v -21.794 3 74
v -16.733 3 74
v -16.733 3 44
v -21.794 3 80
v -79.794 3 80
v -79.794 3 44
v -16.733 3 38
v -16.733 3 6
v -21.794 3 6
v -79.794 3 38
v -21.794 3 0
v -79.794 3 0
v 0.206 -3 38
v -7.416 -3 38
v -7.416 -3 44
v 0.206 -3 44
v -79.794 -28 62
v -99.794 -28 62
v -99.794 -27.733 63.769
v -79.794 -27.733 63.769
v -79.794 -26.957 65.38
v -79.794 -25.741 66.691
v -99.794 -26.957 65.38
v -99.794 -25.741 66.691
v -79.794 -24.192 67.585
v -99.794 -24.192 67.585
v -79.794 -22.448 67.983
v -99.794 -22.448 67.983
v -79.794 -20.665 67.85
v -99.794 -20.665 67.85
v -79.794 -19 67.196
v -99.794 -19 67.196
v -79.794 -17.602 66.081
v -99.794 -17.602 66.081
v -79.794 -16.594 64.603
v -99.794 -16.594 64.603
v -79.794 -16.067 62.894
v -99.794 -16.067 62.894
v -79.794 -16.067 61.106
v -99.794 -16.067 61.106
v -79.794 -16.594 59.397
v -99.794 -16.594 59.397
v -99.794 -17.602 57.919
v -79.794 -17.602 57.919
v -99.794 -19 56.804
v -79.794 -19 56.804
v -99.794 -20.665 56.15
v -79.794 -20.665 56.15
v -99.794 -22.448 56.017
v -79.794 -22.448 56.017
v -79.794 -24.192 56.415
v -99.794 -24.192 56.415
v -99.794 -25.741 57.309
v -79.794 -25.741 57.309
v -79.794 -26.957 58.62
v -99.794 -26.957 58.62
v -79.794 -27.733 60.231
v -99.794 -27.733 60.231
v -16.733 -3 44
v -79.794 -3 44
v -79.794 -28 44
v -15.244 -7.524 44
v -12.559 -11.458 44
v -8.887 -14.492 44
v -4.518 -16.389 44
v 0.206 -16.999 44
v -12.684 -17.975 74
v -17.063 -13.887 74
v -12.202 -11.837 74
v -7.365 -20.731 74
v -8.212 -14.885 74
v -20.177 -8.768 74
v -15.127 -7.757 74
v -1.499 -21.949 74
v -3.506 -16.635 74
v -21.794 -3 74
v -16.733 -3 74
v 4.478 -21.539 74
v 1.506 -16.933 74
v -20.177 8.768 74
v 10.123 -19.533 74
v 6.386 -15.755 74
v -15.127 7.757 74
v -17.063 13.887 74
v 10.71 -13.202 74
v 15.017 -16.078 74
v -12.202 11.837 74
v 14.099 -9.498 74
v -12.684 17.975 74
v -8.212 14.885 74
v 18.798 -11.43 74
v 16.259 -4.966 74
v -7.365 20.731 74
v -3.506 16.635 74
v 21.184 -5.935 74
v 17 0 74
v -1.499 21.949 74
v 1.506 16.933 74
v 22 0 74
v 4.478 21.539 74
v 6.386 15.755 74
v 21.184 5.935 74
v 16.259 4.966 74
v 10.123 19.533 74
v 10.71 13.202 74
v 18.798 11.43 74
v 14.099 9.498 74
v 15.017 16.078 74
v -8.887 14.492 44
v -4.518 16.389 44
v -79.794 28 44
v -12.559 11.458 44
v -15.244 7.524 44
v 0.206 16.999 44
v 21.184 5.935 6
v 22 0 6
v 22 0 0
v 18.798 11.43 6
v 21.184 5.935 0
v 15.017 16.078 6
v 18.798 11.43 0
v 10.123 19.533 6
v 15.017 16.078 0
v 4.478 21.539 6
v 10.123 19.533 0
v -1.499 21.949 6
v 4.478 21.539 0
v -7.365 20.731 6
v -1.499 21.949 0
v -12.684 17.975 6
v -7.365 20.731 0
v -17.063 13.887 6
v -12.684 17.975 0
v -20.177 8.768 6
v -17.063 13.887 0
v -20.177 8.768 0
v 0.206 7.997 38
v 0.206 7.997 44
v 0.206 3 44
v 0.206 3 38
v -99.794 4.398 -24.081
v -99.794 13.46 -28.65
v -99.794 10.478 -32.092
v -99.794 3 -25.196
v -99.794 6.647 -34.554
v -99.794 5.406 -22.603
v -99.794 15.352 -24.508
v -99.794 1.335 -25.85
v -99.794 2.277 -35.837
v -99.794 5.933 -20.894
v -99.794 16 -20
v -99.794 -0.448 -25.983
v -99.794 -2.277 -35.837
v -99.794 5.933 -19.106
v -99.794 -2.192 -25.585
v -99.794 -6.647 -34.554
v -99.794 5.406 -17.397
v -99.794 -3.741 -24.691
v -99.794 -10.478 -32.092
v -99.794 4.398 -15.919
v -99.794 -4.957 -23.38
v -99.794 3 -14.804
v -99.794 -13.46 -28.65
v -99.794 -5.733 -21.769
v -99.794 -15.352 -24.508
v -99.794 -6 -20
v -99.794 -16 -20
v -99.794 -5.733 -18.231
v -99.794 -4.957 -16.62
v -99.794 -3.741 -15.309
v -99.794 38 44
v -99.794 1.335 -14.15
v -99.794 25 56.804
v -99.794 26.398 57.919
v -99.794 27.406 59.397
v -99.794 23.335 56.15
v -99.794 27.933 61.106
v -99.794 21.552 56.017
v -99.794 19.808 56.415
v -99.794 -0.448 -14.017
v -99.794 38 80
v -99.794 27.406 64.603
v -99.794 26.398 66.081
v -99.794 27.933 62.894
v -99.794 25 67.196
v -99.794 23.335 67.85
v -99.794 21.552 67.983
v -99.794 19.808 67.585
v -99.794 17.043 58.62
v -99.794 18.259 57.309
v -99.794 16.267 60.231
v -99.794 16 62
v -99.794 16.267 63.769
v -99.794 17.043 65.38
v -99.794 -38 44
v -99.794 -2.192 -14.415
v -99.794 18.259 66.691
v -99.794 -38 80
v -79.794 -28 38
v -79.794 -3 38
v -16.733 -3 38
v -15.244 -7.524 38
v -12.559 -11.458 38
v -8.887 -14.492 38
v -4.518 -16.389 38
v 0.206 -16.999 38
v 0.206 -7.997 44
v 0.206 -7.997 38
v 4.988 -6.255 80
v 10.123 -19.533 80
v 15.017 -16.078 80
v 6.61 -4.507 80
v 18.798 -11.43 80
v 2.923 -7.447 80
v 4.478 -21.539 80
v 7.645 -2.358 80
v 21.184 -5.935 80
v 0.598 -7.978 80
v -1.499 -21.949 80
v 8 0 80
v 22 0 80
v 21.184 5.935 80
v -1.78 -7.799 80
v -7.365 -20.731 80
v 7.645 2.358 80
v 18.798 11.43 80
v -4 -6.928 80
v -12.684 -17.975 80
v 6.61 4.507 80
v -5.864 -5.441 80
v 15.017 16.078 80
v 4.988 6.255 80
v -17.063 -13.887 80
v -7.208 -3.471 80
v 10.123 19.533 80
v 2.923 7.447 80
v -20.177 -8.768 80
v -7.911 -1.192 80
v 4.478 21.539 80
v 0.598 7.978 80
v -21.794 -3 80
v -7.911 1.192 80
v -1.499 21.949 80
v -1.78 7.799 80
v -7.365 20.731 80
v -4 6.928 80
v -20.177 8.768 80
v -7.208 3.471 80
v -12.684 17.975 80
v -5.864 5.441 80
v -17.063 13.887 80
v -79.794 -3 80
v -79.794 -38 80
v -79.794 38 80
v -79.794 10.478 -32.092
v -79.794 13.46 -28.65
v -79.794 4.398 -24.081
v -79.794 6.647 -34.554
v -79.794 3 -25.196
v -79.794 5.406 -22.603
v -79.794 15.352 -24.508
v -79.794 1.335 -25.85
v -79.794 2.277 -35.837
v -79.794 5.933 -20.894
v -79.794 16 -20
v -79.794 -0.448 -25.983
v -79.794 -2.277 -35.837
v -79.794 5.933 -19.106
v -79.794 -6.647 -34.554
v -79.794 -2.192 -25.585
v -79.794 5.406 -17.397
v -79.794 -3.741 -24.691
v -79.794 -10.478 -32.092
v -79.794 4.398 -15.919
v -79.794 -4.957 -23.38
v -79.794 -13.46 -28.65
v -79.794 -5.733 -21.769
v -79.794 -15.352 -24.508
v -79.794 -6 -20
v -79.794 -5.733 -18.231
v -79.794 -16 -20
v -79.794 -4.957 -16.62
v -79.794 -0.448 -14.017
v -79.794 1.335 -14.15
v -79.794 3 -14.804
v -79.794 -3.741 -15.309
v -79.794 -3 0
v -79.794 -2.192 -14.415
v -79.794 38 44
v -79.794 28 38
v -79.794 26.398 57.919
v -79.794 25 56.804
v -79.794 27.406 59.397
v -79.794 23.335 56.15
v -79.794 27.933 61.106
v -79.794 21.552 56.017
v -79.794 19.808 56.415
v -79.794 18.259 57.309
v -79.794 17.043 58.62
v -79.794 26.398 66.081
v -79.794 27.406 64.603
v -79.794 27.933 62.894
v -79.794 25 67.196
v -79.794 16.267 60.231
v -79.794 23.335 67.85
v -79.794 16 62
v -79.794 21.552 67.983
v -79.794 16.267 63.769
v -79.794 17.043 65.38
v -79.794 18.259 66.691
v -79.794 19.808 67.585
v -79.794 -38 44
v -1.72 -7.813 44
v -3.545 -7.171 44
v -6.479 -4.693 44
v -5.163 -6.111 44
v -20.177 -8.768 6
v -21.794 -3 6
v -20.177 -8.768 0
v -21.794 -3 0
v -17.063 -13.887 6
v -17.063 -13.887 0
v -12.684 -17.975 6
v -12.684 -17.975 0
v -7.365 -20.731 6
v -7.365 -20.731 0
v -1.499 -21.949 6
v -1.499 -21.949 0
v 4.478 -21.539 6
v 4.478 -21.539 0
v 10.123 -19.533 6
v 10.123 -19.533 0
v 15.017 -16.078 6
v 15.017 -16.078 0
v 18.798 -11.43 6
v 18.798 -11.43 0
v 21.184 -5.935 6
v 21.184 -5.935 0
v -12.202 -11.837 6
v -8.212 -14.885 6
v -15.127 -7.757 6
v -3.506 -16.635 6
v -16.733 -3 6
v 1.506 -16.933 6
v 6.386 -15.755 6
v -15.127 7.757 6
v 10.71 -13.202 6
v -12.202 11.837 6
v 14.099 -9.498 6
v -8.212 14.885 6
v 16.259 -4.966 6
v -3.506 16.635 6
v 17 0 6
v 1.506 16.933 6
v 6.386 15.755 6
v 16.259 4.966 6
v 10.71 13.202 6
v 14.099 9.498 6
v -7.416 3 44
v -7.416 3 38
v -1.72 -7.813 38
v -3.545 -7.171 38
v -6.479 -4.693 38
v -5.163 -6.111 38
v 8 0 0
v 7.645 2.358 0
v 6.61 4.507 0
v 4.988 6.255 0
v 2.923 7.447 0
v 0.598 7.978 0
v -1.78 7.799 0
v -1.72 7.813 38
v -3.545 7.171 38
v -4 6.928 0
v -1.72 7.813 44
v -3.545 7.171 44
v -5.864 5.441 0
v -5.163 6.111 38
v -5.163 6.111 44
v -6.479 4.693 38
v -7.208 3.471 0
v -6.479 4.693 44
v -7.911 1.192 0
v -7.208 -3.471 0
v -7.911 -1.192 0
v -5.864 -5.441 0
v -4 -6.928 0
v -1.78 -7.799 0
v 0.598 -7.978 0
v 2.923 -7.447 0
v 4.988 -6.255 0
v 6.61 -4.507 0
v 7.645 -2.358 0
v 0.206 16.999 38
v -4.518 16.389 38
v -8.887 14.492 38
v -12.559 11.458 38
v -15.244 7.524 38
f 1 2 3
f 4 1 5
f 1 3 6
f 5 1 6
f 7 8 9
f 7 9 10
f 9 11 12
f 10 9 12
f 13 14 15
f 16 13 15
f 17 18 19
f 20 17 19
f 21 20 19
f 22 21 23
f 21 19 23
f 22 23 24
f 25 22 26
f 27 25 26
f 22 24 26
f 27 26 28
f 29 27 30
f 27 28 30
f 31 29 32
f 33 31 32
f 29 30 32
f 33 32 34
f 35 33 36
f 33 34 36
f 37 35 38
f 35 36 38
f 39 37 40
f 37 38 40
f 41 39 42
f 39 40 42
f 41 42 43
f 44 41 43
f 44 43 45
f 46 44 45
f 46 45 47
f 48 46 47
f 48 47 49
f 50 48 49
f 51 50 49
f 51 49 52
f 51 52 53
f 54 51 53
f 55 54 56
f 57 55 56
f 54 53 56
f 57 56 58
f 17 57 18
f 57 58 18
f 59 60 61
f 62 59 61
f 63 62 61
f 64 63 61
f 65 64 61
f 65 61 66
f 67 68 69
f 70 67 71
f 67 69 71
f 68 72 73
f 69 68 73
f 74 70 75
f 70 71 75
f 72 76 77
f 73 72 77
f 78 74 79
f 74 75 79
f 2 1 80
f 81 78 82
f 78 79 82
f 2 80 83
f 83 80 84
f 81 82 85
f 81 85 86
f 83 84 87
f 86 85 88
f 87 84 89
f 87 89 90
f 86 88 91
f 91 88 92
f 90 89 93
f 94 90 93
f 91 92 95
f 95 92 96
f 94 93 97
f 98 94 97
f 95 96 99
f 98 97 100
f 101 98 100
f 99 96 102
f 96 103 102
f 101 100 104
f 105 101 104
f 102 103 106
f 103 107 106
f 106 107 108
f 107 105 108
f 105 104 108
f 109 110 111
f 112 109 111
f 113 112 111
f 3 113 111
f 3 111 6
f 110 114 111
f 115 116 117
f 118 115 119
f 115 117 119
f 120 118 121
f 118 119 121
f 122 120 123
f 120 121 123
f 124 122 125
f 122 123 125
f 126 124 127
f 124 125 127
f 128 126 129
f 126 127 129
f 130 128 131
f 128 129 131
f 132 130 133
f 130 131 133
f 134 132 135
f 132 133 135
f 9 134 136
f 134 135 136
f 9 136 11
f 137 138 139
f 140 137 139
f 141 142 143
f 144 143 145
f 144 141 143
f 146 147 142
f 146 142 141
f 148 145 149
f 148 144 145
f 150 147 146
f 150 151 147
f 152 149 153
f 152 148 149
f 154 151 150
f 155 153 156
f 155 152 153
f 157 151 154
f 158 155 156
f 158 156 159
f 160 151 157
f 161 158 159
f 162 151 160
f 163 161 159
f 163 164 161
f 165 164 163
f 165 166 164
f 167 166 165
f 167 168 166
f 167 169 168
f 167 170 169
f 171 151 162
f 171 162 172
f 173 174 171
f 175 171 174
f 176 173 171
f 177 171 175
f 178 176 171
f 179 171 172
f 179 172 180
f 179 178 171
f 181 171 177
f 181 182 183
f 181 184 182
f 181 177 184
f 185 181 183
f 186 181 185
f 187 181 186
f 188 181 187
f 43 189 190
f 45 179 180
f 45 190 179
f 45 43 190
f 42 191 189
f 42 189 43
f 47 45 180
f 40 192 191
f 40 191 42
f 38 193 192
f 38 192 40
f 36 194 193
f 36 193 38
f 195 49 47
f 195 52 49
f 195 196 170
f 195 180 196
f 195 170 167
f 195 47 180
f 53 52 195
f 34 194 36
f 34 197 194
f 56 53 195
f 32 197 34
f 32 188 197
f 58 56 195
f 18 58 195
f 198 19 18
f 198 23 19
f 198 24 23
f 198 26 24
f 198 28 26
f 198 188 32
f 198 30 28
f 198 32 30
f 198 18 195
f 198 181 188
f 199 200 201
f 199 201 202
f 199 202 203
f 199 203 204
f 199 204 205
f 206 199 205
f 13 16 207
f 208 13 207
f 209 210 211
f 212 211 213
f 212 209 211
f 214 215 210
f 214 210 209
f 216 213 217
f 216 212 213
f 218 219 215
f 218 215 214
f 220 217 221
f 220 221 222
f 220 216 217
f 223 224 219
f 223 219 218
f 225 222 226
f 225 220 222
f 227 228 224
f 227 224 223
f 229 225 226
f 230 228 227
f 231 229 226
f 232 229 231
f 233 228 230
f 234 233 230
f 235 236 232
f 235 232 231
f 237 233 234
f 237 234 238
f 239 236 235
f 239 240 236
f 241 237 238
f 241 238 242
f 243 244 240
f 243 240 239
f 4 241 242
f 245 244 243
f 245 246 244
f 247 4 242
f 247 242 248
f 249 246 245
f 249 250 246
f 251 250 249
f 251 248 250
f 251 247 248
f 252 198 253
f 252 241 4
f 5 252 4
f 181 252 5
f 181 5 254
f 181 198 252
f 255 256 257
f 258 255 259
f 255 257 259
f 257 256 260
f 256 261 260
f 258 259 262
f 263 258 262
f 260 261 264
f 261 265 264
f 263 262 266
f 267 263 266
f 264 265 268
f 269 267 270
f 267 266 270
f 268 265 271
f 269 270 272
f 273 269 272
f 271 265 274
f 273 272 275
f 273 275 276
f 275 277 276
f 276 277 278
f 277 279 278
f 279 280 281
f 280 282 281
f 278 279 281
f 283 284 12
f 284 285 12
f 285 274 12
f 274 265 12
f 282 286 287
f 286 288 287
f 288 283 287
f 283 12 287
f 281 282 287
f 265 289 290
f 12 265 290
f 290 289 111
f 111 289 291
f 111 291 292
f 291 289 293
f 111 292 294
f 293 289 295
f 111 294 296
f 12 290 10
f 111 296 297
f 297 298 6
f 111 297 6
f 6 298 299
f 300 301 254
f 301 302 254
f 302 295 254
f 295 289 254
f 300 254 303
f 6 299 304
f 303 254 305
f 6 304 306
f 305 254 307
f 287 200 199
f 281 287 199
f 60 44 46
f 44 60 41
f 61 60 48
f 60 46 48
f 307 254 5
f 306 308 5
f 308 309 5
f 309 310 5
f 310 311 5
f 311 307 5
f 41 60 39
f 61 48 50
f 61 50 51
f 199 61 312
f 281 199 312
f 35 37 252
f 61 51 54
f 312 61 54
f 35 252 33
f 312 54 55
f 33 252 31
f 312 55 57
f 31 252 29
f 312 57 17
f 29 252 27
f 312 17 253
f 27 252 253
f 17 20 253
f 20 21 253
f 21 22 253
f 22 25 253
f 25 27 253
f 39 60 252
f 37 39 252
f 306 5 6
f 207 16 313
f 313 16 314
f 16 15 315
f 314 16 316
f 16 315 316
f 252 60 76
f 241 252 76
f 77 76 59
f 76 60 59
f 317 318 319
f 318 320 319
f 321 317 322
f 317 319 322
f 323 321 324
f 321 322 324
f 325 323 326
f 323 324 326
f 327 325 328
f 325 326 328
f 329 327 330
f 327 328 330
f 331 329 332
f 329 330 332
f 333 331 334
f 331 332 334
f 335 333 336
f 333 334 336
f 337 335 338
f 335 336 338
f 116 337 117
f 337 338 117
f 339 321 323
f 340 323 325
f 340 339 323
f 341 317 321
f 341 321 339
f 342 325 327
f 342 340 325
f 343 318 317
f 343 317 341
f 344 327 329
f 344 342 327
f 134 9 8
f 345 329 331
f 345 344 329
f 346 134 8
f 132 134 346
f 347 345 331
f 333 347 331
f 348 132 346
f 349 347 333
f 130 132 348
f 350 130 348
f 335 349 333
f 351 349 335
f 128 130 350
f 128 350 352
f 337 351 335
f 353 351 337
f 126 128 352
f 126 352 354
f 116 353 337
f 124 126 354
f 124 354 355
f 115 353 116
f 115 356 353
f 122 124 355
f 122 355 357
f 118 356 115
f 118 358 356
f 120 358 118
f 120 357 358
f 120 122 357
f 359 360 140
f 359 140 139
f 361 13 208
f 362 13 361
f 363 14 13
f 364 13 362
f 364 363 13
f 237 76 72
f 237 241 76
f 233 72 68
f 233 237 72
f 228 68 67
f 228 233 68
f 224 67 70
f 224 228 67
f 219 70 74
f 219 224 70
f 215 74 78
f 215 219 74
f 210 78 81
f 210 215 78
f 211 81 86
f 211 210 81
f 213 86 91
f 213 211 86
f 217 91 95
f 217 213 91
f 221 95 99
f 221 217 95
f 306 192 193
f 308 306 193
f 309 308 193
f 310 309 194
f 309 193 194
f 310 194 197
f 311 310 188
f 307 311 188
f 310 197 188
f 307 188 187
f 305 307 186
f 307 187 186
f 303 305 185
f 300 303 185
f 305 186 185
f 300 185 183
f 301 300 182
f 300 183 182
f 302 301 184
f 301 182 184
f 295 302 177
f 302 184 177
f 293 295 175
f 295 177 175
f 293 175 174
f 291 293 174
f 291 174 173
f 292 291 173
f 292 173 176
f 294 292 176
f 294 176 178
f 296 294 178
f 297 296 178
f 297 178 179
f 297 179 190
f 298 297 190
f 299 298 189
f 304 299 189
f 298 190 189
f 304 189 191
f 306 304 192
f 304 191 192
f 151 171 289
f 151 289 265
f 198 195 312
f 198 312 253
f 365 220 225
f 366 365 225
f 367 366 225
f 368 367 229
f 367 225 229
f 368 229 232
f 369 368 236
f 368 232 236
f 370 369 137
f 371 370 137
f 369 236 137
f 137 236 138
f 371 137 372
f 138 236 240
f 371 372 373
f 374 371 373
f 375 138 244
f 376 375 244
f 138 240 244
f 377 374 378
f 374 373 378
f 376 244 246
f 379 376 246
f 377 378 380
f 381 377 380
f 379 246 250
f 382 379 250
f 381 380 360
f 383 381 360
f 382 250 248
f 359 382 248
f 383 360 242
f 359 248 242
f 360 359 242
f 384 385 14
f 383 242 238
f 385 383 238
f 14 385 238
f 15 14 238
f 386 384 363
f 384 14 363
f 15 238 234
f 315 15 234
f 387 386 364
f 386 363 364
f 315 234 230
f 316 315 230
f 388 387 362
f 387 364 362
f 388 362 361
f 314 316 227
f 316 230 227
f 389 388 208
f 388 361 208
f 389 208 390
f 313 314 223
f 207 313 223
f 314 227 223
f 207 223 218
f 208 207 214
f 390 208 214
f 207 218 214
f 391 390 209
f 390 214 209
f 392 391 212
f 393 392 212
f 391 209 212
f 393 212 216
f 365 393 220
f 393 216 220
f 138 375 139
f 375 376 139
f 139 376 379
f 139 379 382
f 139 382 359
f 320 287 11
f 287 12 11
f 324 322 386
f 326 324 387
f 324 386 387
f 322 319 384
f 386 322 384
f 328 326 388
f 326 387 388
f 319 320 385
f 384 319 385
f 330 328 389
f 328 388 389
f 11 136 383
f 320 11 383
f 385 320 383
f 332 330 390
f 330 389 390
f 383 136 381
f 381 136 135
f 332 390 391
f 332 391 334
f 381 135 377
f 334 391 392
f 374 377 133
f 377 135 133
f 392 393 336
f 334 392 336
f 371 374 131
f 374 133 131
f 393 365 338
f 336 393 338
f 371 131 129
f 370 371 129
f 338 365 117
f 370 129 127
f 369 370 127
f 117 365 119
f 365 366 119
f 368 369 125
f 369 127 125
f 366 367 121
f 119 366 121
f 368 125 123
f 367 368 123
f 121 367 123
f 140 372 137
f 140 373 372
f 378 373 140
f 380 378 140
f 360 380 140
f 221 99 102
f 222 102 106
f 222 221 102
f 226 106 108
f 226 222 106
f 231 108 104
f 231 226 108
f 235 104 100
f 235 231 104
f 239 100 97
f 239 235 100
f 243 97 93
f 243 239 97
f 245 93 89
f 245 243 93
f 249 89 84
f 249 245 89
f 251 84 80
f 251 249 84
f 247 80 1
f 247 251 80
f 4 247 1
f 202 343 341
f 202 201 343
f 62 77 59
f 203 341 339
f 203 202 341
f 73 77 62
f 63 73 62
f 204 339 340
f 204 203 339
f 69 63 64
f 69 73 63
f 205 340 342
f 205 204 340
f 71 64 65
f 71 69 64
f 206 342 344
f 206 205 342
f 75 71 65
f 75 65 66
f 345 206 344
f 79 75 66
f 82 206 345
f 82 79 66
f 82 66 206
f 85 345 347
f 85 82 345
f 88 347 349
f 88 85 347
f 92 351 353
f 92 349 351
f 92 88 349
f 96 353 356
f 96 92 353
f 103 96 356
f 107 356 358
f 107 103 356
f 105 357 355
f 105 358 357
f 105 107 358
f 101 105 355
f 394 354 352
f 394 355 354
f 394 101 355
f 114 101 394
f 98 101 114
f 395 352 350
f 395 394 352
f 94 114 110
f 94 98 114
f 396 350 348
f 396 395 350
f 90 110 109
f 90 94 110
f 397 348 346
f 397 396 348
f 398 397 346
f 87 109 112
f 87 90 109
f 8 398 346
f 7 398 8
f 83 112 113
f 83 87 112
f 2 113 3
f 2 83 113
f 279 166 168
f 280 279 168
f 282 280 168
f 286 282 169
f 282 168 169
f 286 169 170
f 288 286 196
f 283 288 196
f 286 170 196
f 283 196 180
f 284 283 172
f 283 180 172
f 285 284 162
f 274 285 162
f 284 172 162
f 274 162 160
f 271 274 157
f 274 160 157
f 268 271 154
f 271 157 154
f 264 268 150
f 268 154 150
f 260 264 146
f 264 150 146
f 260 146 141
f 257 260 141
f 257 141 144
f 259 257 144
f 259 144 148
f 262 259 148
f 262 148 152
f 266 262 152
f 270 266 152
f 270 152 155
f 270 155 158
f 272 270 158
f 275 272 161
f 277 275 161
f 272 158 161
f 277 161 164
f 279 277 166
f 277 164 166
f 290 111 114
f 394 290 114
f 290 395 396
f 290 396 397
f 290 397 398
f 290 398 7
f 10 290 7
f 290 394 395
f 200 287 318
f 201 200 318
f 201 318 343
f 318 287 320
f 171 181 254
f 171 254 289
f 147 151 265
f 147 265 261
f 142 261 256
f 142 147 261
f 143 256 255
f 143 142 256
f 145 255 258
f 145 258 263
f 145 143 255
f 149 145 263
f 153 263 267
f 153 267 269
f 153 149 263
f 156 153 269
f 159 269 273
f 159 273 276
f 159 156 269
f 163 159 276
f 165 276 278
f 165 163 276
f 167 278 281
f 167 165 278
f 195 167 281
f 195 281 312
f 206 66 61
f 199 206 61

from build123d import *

# Parameters (mm, degrees)
F0_R      = 22
F0_R_2    = 17
F1_DEPTH  = 6
F0_R_3    = 8
F2_DEPTH  = 40
F6_DEPTH  = 80
F7_R      = 6
F8_DEPTH  = 20
F9_W      = 25
F9_H      = 6
F10_DEPTH = 100
F12_DEPTH = 6
F14_DEPTH = 6


with BuildPart() as f1:
    # F0 (on Top) → F1 (new body)
    with BuildSketch(Plane.XY):
        Circle(F0_R)
        Circle(F0_R_2, mode=Mode.SUBTRACT)
    extrude(amount=F1_DEPTH)

    # F0 (on Top) → F2 (join)
    with BuildSketch(Plane.XY):
        Circle(F0_R_2)
        Circle(F0_R_3, mode=Mode.SUBTRACT)
    extrude(amount=F2_DEPTH)


with BuildPart() as f3_1:
    # F3: instance of F1
    add(f1.part.mirror(Plane.XY.offset(40)))


with BuildPart() as f1_1:
    add(f1.part)

    # F5: union F3_1
    add(f3_1.part)

    # F4 (on Top) → F6 (join, through all)
    with BuildSketch(Plane.XY):
        Polygon((-16.7332005307, 3), (-21.7944947177, 3), (-99.7944947177, 3), (-99.7944947177, -3), (-21.7944947177, -3), (-16.7332005307, -3), align=None)
    extrude(amount=F6_DEPTH)

    # F7 (on face) → F8 (join)
    with BuildSketch(Plane(origin=(-99.7944947177, 0, 0), x_dir=(0, -1, 0), z_dir=(-1, 0, 0))):
        with BuildLine():
            Line((38, 80), (3, 80))
            Line((3, 80), (3, 44))
            Line((3, 44), (28, 44))
            Line((28, 44), (28, 38))
            Line((28, 38), (3, 38))
            Line((3, 38), (3, 0))
            Line((3, 0), (-3, 0))
            Line((-3, 0), (-3, 38))
            Line((-3, 38), (-28, 38))
            Line((-28, 38), (-28, 44))
            Line((-28, 44), (-3, 44))
            Line((-3, 44), (-3, 80))
            Line((-3, 80), (-38, 80))
            Line((-38, 80), (-38, 44))
            Line((-38, 44), (-16, -20))
            ThreePointArc((-16, -20), (0, -36), (16, -20))
            Line((16, -20), (38, 44))
            Line((38, 44), (38, 80))
        make_face()
        with Locations((0, -20)):
            Circle(F7_R, mode=Mode.SUBTRACT)
        with Locations((-22, 62)):
            Circle(F7_R, mode=Mode.SUBTRACT)
        with Locations((22, 62)):
            Circle(F7_R, mode=Mode.SUBTRACT)
    extrude(amount=-F8_DEPTH)

    # F9 (on face) → F10 (join)
    with BuildSketch(Plane(origin=(-99.7944947177, 0, 0), x_dir=(0, -1, 0), z_dir=(-1, 0, 0))):
        with Locations((-15.5, 41)):
            Rectangle(F9_W, F9_H)
        with Locations((15.5, 41)):
            Rectangle(F9_W, F9_H)
    extrude(amount=-F10_DEPTH)

    # F11 (on face) → F12 (cut, through all)
    with BuildSketch(Plane.XY.offset(44)):
        Polygon((0.2055052823, -16.9987578246), (-79.7944947177, -28), (0.2055052823, -28), align=None)
    extrude(amount=-F12_DEPTH, mode=Mode.SUBTRACT)

    # F13 (on face) → F14 (cut, through all)
    with BuildSketch(Plane.XY.offset(44)):
        Polygon((0.2055052823, 28), (-79.7944947177, 28), (0.2055052823, 16.9987578246), align=None)
    extrude(amount=-F14_DEPTH, mode=Mode.SUBTRACT)


solid = f1_1.part
